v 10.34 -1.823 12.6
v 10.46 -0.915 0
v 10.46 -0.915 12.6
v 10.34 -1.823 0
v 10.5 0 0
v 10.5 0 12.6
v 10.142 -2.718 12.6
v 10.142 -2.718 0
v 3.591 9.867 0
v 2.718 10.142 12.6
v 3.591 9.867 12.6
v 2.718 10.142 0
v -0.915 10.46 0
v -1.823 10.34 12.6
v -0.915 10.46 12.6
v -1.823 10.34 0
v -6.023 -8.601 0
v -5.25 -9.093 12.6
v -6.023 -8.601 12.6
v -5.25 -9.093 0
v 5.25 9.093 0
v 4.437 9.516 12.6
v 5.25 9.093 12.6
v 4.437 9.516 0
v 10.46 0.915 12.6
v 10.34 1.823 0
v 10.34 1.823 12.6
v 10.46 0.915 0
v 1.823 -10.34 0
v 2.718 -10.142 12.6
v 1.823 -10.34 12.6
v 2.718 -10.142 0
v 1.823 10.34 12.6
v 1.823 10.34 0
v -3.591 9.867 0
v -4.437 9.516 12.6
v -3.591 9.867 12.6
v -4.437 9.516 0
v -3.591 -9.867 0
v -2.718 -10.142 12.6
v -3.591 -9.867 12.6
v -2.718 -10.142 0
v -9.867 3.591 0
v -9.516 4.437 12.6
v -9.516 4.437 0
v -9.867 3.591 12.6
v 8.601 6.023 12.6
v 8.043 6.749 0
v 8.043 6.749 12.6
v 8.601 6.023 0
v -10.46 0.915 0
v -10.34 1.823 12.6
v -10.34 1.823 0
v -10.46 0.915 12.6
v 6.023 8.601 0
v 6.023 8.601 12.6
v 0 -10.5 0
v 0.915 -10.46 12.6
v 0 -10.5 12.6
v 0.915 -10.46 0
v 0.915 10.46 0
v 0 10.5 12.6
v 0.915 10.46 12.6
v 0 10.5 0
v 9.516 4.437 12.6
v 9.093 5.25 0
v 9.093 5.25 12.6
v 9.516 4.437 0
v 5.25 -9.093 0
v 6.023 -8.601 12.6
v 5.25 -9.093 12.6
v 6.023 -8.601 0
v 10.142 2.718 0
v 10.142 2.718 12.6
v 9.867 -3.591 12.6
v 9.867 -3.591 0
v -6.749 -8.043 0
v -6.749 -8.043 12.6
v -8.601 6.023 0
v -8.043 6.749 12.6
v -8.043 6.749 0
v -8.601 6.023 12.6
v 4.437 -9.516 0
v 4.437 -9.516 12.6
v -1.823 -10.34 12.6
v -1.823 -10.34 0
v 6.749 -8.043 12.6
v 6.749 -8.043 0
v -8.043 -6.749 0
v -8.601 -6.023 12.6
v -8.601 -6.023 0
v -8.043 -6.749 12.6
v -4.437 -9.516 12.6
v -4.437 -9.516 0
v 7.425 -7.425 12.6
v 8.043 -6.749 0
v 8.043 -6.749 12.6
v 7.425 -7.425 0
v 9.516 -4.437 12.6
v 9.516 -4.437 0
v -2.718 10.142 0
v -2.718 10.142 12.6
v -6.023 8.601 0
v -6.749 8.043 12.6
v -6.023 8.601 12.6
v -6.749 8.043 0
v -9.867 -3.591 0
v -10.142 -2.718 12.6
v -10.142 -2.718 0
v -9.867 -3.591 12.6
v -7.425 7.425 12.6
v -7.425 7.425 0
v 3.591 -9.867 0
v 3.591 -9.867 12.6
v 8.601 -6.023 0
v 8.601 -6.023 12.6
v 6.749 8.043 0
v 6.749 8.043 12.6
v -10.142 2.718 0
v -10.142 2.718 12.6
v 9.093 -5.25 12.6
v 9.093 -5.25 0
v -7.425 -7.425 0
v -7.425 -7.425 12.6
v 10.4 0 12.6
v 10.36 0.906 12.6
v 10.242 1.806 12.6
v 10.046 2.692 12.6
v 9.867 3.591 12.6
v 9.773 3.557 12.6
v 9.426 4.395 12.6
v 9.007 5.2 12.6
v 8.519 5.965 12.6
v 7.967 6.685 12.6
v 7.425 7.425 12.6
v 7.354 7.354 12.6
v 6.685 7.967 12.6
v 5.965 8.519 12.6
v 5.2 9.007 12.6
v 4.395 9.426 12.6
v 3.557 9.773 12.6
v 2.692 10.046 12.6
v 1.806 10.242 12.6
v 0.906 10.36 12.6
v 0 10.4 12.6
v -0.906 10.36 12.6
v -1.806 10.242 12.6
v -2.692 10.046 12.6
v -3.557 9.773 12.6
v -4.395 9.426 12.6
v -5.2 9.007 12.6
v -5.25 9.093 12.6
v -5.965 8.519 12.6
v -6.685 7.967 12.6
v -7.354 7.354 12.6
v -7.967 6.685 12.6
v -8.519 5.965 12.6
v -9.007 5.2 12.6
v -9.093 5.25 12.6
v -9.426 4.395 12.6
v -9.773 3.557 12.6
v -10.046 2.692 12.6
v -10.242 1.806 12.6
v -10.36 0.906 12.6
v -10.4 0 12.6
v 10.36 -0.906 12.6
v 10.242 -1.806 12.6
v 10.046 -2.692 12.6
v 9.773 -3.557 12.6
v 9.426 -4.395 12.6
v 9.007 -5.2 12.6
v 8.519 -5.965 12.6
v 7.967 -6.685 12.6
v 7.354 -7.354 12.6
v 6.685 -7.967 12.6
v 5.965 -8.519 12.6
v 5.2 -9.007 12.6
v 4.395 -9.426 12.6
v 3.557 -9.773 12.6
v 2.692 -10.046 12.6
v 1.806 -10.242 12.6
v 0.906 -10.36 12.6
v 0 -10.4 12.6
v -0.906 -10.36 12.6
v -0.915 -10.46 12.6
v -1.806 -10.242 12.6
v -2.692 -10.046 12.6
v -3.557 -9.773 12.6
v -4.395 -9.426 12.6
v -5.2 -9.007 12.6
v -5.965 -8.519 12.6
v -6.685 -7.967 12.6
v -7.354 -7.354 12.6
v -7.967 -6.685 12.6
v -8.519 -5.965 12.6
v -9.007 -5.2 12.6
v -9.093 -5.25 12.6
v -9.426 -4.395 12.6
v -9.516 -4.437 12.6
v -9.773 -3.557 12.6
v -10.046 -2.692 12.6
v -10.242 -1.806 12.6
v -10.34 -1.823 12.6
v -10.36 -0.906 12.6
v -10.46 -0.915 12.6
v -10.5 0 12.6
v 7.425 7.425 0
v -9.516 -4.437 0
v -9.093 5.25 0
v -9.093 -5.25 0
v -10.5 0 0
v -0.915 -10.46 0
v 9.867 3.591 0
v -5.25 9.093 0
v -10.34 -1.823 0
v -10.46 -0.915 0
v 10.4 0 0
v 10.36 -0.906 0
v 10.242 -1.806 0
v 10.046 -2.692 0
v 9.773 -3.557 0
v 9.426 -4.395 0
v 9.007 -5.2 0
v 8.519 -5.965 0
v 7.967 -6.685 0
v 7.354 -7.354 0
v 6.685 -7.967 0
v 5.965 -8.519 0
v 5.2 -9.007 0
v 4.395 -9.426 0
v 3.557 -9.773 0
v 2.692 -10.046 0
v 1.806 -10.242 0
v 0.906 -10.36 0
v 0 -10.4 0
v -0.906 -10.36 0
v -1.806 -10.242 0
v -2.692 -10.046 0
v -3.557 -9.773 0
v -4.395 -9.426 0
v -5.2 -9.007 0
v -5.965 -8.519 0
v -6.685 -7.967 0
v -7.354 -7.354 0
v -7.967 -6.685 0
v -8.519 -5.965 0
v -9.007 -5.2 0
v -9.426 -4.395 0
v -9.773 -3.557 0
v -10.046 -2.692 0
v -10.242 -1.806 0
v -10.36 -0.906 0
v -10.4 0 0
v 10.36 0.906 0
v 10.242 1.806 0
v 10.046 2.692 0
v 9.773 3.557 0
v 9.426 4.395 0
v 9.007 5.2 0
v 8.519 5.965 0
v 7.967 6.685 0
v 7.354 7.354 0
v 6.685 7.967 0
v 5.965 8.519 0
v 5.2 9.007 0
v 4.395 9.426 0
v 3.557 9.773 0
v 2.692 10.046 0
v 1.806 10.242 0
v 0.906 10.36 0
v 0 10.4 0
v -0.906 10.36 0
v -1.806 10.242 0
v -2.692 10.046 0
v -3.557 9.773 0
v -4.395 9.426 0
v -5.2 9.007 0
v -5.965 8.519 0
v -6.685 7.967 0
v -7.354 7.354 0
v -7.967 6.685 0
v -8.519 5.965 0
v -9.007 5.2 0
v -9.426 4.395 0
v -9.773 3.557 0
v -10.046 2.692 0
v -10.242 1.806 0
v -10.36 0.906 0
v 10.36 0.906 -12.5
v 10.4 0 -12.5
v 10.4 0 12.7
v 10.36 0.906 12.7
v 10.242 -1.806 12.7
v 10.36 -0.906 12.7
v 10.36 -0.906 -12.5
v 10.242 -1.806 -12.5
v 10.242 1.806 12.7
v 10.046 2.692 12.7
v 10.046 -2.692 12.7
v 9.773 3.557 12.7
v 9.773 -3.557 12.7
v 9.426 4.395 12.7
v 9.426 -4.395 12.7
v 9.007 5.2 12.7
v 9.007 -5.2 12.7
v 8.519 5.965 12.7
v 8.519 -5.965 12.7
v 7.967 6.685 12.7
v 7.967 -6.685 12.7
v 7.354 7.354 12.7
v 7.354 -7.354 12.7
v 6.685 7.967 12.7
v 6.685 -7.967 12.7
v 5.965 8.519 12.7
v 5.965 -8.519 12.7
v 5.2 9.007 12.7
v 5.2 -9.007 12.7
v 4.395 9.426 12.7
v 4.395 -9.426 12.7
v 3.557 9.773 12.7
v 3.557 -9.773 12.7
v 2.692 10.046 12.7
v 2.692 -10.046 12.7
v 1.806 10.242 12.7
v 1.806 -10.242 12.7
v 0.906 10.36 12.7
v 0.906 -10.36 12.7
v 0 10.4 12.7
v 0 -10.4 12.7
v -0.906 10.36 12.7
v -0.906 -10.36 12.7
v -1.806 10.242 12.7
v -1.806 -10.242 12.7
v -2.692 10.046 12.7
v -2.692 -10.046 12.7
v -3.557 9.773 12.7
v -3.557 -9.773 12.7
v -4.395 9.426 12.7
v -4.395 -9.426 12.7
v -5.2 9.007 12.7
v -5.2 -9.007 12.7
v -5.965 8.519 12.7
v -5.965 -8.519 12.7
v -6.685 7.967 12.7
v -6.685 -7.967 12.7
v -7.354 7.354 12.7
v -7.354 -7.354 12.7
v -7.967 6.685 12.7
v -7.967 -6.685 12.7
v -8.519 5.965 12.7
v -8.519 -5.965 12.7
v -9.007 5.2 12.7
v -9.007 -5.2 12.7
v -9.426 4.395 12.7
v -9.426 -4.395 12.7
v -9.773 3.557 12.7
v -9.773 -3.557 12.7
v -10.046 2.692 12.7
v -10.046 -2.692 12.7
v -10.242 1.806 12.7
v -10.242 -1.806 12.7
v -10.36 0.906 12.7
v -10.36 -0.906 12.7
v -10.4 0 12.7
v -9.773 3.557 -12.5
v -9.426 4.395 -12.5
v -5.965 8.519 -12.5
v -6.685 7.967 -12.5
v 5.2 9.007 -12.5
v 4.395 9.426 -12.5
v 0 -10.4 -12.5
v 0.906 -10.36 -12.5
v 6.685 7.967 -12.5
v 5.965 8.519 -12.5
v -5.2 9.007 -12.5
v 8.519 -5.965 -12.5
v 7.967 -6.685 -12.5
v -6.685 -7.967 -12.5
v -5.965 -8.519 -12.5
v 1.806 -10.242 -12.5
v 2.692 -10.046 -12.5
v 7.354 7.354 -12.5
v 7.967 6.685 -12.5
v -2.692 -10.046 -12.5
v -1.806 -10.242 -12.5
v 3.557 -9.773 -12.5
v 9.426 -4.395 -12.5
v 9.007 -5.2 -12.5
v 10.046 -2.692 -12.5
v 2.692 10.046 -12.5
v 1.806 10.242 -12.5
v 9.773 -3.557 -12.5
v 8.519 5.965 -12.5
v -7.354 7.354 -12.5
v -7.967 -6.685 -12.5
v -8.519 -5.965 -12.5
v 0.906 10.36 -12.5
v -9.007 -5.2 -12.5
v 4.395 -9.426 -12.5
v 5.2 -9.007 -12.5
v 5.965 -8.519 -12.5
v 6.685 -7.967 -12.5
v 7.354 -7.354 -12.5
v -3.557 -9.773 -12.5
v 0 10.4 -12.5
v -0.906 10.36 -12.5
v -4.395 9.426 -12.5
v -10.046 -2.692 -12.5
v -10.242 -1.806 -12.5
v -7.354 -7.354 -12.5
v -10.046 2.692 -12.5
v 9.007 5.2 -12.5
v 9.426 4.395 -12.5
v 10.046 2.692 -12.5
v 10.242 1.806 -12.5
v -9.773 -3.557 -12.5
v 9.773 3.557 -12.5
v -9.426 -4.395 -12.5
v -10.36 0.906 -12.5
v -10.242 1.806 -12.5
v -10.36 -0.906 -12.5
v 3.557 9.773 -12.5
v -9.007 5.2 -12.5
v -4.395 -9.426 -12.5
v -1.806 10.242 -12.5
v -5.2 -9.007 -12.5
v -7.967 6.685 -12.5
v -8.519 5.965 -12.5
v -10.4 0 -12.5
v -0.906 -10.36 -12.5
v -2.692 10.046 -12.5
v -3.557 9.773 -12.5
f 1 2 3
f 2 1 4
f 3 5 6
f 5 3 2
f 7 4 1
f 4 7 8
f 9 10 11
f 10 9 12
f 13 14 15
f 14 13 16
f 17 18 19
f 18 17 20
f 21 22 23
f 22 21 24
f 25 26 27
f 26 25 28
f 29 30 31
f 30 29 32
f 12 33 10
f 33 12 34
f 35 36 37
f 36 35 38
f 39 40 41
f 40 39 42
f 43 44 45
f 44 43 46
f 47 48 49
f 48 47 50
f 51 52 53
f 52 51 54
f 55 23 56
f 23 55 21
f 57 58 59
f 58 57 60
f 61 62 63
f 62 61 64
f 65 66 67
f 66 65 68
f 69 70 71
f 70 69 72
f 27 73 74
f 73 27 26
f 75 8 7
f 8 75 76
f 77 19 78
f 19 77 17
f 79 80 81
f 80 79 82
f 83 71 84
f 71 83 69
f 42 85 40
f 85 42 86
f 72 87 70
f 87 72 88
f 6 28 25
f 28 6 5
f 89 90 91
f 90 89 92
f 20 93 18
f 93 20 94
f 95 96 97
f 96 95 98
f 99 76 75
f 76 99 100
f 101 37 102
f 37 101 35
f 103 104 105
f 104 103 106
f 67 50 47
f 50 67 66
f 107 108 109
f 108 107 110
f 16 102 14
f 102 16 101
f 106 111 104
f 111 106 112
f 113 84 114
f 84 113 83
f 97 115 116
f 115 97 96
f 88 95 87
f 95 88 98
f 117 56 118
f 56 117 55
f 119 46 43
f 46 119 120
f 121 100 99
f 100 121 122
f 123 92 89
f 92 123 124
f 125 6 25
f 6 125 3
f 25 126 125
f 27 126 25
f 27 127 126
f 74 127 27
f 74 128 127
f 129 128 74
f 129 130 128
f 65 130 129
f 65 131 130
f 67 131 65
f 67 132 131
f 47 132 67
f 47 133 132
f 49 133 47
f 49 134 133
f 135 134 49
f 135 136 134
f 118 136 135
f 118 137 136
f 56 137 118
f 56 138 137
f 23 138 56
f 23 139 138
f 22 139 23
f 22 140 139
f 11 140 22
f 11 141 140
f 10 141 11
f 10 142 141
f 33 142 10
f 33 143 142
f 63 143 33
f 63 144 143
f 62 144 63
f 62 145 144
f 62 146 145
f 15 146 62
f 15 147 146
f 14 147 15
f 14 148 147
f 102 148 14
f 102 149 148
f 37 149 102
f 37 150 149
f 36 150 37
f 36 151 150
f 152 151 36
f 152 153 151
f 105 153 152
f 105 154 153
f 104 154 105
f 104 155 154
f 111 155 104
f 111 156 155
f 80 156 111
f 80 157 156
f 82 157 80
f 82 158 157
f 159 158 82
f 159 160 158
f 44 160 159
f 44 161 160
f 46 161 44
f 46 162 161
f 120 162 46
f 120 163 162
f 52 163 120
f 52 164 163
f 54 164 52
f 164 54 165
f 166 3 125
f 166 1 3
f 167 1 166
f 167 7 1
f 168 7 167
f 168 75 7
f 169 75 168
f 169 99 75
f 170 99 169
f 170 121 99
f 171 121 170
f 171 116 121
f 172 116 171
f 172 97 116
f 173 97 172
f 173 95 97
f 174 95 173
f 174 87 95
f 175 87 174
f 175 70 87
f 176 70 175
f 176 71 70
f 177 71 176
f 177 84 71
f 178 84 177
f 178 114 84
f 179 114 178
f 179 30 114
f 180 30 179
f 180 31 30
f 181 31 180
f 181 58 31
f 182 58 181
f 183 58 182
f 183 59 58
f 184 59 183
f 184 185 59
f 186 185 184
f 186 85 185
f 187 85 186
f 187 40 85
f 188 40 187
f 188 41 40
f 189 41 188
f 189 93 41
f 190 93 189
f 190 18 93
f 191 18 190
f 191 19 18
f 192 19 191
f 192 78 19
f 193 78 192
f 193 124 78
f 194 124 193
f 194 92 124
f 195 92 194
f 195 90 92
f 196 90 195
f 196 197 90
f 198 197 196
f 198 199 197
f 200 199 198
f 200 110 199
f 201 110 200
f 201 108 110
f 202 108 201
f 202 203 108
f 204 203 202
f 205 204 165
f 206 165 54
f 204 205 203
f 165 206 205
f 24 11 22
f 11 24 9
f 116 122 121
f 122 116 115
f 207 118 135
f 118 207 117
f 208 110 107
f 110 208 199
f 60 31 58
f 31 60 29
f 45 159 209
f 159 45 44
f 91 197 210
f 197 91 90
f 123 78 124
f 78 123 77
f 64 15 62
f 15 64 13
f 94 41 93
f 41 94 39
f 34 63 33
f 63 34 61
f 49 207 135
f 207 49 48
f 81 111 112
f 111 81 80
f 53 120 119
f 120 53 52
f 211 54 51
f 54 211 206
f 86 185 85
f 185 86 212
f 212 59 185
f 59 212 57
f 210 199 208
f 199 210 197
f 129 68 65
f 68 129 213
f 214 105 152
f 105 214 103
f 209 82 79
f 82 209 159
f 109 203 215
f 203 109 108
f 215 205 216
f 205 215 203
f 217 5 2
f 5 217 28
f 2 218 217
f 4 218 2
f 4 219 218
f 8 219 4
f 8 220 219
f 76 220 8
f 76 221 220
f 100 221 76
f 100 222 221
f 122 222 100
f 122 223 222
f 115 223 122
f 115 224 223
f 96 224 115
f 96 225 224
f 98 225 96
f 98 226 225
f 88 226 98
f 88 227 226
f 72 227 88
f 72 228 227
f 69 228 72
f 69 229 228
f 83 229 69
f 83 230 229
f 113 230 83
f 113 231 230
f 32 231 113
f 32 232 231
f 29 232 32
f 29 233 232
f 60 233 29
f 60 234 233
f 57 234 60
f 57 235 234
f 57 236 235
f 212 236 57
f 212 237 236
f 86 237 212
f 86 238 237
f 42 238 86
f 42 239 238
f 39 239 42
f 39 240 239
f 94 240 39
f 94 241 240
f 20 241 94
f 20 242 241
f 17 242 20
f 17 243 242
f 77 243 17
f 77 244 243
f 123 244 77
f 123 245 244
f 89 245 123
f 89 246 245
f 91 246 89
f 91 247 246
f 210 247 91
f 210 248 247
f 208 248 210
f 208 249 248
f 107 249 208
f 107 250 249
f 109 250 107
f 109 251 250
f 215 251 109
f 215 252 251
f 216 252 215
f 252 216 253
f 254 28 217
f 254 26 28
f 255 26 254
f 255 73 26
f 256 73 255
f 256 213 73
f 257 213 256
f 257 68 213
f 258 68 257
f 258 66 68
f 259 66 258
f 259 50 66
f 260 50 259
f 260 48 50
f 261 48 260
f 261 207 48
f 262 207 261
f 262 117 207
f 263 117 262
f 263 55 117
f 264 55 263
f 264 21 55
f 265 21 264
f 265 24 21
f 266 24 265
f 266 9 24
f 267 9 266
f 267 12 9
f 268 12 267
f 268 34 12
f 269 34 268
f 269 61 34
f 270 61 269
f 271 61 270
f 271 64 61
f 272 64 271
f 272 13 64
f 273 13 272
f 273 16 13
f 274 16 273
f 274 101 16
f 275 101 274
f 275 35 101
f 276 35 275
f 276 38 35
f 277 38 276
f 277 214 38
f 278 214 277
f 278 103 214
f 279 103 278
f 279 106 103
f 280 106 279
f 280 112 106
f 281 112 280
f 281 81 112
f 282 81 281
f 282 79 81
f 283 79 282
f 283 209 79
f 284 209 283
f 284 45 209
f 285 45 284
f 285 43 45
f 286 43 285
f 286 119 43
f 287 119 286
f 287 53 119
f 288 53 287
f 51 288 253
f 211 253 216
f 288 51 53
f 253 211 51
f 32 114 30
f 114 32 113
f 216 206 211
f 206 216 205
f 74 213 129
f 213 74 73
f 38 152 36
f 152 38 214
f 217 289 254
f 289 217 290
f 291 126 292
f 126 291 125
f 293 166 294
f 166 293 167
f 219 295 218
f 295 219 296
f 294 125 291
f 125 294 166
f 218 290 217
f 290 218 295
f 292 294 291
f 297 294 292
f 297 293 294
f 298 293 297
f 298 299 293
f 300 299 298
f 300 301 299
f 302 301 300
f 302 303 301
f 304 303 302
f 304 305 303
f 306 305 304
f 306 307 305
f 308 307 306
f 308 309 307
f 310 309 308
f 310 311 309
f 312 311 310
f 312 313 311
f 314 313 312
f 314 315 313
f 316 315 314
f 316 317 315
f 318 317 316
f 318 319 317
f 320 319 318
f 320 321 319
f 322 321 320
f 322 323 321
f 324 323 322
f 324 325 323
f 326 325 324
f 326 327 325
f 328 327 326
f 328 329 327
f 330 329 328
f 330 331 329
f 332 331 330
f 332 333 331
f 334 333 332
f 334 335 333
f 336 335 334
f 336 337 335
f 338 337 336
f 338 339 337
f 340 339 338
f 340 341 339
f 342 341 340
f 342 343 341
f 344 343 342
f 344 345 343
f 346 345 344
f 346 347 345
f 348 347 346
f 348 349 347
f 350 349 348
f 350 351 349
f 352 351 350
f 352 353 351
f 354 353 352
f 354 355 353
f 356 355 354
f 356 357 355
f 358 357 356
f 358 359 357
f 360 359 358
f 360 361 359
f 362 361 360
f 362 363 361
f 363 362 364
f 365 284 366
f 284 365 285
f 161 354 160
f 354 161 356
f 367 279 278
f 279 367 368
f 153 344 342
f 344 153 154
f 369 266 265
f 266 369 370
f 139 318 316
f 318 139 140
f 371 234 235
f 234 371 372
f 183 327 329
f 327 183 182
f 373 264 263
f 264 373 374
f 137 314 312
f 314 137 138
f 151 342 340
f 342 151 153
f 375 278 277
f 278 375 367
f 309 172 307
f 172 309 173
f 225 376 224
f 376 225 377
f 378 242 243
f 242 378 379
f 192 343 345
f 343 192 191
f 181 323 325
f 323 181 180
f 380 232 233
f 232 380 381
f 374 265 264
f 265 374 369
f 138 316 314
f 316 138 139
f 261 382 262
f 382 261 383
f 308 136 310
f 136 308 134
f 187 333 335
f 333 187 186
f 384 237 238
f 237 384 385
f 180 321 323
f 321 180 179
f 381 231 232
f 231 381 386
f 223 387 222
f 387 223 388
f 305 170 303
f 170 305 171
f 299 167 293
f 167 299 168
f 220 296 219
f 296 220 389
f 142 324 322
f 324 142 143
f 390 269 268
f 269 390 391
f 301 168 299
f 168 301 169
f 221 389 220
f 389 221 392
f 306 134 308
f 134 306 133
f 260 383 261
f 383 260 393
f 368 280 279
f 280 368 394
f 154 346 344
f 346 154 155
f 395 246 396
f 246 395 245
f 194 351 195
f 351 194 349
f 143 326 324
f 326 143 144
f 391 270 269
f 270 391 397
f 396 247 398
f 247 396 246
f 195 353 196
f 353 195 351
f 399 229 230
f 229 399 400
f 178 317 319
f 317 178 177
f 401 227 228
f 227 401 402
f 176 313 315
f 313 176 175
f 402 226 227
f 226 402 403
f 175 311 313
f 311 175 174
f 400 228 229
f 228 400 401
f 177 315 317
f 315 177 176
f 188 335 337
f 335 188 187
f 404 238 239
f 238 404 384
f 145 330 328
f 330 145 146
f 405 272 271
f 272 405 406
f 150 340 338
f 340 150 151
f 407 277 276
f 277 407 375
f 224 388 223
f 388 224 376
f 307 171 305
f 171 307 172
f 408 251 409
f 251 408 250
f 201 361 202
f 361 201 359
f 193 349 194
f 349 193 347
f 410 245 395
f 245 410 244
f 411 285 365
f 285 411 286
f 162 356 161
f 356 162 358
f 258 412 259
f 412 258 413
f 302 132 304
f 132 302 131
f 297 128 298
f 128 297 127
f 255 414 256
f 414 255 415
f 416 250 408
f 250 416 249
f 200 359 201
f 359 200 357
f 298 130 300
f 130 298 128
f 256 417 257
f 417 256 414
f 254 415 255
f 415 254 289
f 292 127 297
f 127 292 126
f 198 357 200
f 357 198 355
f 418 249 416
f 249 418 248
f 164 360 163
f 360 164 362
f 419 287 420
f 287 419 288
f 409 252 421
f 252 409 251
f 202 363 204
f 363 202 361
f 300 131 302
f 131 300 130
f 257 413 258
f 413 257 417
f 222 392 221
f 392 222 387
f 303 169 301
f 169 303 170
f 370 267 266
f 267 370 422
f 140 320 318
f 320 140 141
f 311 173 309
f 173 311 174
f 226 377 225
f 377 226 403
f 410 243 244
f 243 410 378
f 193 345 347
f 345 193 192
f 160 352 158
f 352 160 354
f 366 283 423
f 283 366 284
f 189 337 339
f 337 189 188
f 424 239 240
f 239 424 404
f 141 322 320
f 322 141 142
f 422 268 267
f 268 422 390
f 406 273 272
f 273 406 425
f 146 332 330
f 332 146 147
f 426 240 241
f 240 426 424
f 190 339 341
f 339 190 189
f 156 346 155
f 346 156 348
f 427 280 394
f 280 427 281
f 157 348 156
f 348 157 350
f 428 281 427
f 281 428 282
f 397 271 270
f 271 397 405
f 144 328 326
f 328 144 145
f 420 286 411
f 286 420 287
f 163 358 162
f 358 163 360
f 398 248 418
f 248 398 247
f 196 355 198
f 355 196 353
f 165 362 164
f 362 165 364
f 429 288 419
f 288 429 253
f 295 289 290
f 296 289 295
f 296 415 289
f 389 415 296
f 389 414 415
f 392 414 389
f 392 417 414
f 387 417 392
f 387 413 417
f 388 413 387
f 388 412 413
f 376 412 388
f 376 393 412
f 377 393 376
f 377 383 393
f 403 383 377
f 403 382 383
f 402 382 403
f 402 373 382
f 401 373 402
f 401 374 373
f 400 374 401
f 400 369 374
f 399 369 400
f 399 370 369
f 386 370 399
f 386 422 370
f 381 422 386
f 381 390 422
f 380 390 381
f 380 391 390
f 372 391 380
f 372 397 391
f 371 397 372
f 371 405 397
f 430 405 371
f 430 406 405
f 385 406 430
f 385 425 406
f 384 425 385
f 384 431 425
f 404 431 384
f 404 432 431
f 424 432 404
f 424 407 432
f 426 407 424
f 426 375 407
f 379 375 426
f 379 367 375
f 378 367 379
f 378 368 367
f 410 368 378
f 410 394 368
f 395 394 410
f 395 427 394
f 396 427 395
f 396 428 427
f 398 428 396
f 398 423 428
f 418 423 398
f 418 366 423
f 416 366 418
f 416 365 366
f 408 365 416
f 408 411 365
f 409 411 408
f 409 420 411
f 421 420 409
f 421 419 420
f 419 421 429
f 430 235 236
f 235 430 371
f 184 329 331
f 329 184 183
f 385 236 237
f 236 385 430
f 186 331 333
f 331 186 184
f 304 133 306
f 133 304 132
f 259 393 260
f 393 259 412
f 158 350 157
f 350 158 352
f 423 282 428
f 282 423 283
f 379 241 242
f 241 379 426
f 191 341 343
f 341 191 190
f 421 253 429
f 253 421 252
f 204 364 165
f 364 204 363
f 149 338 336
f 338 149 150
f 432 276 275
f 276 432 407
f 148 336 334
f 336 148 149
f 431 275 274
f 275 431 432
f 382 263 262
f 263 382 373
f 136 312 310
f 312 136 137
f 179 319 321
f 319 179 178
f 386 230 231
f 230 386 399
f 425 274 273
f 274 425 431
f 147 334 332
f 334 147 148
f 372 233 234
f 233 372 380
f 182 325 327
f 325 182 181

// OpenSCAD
thickness = 2.5;
// 6mm or so diameter, 4.5mm on the flat side, 7.6mm deep, 16mm hole around it
inner_shell_id = 6.35;
inner_shell_od = 6.35 + thickness * 2;
inner_shell_notch = 1.5;
inner_shell_depth = 7.6;
outer_shell_id = 16;
outer_shell_od = 16 + thickness * 2;
outer_shell_depth = inner_shell_depth + thickness;
outer_shell_height = inner_shell_depth + thickness * 2;

// use this with difference() from your part to make sure there's appropriate
// area
module knob_clearer($fa=5, $fs=0.5)
{
    rotate([180,0,0])
    translate([0,0,-(outer_shell_height+0.1)])
        cylinder(d=outer_shell_od - 0.2, h=outer_shell_height*2);
}

// then use this with union outside of that to add the base of the knob
module knob($fa = 5, $fs = 0.5, slop=0.1)
{
    translate([0,0,outer_shell_height])
    rotate([180,0,0])
    union()
    {
        difference()
        {
            cylinder(d=outer_shell_od, h=outer_shell_height);
            translate([0,0,thickness])
                cylinder(d=outer_shell_id, h=outer_shell_depth+0.1);
        }
        difference()
        {
            translate([0,0,thickness-0.1])
                cylinder(d=inner_shell_od, h=inner_shell_depth+0.2);
            translate([0,0,thickness])
                difference()
                {
                    cylinder(d=inner_shell_id+slop*2, h=inner_shell_depth+0.2);
                    translate([inner_shell_id/2-inner_shell_notch, -inner_shell_od/2, -0.1])
                        cube([inner_shell_od, inner_shell_od, inner_shell_depth+0.4+slop]);
                }
        }
    }
}

knob_clearer();
knob();
